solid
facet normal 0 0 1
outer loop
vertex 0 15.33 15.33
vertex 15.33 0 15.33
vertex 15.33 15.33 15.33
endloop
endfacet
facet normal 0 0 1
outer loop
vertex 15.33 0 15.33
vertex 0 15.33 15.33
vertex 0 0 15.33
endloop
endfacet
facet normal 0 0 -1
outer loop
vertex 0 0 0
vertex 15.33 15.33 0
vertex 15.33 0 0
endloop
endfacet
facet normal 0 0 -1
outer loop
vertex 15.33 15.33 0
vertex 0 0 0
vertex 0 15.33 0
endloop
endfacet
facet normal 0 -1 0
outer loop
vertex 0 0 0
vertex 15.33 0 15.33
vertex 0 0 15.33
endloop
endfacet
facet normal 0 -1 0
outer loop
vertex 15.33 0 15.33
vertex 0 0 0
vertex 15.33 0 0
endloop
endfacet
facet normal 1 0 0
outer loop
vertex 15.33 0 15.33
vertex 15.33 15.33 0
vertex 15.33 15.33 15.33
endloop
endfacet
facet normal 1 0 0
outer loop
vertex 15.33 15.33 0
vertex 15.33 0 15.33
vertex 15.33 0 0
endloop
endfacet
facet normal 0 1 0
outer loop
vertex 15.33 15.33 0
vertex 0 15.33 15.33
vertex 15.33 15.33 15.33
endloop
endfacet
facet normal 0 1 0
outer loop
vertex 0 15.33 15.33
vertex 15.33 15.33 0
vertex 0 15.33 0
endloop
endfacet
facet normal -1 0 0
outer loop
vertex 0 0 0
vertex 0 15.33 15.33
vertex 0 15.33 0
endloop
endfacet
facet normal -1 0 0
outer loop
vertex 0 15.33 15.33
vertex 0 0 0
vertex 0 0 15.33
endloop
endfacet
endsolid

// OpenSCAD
/********************************************/
/*     Shop Pencil Sharpening Lathe Bit     */
/*                                          */
/*        Created by Jason Hardman          */
/*               2023-10-21                 */
/*                                          */
/********************************************/


/*  Definitions  */
$fn = 500;

inch = 25.4;
mil = 1;

module the_cube(tx=0, ty=0, tz=0, dimention=1) {
    // One inch by one inch by one inch
    translate([tx, ty, tz]) {
        cube(dimention);
    }
}

the_cube(dimention = 15.33);
